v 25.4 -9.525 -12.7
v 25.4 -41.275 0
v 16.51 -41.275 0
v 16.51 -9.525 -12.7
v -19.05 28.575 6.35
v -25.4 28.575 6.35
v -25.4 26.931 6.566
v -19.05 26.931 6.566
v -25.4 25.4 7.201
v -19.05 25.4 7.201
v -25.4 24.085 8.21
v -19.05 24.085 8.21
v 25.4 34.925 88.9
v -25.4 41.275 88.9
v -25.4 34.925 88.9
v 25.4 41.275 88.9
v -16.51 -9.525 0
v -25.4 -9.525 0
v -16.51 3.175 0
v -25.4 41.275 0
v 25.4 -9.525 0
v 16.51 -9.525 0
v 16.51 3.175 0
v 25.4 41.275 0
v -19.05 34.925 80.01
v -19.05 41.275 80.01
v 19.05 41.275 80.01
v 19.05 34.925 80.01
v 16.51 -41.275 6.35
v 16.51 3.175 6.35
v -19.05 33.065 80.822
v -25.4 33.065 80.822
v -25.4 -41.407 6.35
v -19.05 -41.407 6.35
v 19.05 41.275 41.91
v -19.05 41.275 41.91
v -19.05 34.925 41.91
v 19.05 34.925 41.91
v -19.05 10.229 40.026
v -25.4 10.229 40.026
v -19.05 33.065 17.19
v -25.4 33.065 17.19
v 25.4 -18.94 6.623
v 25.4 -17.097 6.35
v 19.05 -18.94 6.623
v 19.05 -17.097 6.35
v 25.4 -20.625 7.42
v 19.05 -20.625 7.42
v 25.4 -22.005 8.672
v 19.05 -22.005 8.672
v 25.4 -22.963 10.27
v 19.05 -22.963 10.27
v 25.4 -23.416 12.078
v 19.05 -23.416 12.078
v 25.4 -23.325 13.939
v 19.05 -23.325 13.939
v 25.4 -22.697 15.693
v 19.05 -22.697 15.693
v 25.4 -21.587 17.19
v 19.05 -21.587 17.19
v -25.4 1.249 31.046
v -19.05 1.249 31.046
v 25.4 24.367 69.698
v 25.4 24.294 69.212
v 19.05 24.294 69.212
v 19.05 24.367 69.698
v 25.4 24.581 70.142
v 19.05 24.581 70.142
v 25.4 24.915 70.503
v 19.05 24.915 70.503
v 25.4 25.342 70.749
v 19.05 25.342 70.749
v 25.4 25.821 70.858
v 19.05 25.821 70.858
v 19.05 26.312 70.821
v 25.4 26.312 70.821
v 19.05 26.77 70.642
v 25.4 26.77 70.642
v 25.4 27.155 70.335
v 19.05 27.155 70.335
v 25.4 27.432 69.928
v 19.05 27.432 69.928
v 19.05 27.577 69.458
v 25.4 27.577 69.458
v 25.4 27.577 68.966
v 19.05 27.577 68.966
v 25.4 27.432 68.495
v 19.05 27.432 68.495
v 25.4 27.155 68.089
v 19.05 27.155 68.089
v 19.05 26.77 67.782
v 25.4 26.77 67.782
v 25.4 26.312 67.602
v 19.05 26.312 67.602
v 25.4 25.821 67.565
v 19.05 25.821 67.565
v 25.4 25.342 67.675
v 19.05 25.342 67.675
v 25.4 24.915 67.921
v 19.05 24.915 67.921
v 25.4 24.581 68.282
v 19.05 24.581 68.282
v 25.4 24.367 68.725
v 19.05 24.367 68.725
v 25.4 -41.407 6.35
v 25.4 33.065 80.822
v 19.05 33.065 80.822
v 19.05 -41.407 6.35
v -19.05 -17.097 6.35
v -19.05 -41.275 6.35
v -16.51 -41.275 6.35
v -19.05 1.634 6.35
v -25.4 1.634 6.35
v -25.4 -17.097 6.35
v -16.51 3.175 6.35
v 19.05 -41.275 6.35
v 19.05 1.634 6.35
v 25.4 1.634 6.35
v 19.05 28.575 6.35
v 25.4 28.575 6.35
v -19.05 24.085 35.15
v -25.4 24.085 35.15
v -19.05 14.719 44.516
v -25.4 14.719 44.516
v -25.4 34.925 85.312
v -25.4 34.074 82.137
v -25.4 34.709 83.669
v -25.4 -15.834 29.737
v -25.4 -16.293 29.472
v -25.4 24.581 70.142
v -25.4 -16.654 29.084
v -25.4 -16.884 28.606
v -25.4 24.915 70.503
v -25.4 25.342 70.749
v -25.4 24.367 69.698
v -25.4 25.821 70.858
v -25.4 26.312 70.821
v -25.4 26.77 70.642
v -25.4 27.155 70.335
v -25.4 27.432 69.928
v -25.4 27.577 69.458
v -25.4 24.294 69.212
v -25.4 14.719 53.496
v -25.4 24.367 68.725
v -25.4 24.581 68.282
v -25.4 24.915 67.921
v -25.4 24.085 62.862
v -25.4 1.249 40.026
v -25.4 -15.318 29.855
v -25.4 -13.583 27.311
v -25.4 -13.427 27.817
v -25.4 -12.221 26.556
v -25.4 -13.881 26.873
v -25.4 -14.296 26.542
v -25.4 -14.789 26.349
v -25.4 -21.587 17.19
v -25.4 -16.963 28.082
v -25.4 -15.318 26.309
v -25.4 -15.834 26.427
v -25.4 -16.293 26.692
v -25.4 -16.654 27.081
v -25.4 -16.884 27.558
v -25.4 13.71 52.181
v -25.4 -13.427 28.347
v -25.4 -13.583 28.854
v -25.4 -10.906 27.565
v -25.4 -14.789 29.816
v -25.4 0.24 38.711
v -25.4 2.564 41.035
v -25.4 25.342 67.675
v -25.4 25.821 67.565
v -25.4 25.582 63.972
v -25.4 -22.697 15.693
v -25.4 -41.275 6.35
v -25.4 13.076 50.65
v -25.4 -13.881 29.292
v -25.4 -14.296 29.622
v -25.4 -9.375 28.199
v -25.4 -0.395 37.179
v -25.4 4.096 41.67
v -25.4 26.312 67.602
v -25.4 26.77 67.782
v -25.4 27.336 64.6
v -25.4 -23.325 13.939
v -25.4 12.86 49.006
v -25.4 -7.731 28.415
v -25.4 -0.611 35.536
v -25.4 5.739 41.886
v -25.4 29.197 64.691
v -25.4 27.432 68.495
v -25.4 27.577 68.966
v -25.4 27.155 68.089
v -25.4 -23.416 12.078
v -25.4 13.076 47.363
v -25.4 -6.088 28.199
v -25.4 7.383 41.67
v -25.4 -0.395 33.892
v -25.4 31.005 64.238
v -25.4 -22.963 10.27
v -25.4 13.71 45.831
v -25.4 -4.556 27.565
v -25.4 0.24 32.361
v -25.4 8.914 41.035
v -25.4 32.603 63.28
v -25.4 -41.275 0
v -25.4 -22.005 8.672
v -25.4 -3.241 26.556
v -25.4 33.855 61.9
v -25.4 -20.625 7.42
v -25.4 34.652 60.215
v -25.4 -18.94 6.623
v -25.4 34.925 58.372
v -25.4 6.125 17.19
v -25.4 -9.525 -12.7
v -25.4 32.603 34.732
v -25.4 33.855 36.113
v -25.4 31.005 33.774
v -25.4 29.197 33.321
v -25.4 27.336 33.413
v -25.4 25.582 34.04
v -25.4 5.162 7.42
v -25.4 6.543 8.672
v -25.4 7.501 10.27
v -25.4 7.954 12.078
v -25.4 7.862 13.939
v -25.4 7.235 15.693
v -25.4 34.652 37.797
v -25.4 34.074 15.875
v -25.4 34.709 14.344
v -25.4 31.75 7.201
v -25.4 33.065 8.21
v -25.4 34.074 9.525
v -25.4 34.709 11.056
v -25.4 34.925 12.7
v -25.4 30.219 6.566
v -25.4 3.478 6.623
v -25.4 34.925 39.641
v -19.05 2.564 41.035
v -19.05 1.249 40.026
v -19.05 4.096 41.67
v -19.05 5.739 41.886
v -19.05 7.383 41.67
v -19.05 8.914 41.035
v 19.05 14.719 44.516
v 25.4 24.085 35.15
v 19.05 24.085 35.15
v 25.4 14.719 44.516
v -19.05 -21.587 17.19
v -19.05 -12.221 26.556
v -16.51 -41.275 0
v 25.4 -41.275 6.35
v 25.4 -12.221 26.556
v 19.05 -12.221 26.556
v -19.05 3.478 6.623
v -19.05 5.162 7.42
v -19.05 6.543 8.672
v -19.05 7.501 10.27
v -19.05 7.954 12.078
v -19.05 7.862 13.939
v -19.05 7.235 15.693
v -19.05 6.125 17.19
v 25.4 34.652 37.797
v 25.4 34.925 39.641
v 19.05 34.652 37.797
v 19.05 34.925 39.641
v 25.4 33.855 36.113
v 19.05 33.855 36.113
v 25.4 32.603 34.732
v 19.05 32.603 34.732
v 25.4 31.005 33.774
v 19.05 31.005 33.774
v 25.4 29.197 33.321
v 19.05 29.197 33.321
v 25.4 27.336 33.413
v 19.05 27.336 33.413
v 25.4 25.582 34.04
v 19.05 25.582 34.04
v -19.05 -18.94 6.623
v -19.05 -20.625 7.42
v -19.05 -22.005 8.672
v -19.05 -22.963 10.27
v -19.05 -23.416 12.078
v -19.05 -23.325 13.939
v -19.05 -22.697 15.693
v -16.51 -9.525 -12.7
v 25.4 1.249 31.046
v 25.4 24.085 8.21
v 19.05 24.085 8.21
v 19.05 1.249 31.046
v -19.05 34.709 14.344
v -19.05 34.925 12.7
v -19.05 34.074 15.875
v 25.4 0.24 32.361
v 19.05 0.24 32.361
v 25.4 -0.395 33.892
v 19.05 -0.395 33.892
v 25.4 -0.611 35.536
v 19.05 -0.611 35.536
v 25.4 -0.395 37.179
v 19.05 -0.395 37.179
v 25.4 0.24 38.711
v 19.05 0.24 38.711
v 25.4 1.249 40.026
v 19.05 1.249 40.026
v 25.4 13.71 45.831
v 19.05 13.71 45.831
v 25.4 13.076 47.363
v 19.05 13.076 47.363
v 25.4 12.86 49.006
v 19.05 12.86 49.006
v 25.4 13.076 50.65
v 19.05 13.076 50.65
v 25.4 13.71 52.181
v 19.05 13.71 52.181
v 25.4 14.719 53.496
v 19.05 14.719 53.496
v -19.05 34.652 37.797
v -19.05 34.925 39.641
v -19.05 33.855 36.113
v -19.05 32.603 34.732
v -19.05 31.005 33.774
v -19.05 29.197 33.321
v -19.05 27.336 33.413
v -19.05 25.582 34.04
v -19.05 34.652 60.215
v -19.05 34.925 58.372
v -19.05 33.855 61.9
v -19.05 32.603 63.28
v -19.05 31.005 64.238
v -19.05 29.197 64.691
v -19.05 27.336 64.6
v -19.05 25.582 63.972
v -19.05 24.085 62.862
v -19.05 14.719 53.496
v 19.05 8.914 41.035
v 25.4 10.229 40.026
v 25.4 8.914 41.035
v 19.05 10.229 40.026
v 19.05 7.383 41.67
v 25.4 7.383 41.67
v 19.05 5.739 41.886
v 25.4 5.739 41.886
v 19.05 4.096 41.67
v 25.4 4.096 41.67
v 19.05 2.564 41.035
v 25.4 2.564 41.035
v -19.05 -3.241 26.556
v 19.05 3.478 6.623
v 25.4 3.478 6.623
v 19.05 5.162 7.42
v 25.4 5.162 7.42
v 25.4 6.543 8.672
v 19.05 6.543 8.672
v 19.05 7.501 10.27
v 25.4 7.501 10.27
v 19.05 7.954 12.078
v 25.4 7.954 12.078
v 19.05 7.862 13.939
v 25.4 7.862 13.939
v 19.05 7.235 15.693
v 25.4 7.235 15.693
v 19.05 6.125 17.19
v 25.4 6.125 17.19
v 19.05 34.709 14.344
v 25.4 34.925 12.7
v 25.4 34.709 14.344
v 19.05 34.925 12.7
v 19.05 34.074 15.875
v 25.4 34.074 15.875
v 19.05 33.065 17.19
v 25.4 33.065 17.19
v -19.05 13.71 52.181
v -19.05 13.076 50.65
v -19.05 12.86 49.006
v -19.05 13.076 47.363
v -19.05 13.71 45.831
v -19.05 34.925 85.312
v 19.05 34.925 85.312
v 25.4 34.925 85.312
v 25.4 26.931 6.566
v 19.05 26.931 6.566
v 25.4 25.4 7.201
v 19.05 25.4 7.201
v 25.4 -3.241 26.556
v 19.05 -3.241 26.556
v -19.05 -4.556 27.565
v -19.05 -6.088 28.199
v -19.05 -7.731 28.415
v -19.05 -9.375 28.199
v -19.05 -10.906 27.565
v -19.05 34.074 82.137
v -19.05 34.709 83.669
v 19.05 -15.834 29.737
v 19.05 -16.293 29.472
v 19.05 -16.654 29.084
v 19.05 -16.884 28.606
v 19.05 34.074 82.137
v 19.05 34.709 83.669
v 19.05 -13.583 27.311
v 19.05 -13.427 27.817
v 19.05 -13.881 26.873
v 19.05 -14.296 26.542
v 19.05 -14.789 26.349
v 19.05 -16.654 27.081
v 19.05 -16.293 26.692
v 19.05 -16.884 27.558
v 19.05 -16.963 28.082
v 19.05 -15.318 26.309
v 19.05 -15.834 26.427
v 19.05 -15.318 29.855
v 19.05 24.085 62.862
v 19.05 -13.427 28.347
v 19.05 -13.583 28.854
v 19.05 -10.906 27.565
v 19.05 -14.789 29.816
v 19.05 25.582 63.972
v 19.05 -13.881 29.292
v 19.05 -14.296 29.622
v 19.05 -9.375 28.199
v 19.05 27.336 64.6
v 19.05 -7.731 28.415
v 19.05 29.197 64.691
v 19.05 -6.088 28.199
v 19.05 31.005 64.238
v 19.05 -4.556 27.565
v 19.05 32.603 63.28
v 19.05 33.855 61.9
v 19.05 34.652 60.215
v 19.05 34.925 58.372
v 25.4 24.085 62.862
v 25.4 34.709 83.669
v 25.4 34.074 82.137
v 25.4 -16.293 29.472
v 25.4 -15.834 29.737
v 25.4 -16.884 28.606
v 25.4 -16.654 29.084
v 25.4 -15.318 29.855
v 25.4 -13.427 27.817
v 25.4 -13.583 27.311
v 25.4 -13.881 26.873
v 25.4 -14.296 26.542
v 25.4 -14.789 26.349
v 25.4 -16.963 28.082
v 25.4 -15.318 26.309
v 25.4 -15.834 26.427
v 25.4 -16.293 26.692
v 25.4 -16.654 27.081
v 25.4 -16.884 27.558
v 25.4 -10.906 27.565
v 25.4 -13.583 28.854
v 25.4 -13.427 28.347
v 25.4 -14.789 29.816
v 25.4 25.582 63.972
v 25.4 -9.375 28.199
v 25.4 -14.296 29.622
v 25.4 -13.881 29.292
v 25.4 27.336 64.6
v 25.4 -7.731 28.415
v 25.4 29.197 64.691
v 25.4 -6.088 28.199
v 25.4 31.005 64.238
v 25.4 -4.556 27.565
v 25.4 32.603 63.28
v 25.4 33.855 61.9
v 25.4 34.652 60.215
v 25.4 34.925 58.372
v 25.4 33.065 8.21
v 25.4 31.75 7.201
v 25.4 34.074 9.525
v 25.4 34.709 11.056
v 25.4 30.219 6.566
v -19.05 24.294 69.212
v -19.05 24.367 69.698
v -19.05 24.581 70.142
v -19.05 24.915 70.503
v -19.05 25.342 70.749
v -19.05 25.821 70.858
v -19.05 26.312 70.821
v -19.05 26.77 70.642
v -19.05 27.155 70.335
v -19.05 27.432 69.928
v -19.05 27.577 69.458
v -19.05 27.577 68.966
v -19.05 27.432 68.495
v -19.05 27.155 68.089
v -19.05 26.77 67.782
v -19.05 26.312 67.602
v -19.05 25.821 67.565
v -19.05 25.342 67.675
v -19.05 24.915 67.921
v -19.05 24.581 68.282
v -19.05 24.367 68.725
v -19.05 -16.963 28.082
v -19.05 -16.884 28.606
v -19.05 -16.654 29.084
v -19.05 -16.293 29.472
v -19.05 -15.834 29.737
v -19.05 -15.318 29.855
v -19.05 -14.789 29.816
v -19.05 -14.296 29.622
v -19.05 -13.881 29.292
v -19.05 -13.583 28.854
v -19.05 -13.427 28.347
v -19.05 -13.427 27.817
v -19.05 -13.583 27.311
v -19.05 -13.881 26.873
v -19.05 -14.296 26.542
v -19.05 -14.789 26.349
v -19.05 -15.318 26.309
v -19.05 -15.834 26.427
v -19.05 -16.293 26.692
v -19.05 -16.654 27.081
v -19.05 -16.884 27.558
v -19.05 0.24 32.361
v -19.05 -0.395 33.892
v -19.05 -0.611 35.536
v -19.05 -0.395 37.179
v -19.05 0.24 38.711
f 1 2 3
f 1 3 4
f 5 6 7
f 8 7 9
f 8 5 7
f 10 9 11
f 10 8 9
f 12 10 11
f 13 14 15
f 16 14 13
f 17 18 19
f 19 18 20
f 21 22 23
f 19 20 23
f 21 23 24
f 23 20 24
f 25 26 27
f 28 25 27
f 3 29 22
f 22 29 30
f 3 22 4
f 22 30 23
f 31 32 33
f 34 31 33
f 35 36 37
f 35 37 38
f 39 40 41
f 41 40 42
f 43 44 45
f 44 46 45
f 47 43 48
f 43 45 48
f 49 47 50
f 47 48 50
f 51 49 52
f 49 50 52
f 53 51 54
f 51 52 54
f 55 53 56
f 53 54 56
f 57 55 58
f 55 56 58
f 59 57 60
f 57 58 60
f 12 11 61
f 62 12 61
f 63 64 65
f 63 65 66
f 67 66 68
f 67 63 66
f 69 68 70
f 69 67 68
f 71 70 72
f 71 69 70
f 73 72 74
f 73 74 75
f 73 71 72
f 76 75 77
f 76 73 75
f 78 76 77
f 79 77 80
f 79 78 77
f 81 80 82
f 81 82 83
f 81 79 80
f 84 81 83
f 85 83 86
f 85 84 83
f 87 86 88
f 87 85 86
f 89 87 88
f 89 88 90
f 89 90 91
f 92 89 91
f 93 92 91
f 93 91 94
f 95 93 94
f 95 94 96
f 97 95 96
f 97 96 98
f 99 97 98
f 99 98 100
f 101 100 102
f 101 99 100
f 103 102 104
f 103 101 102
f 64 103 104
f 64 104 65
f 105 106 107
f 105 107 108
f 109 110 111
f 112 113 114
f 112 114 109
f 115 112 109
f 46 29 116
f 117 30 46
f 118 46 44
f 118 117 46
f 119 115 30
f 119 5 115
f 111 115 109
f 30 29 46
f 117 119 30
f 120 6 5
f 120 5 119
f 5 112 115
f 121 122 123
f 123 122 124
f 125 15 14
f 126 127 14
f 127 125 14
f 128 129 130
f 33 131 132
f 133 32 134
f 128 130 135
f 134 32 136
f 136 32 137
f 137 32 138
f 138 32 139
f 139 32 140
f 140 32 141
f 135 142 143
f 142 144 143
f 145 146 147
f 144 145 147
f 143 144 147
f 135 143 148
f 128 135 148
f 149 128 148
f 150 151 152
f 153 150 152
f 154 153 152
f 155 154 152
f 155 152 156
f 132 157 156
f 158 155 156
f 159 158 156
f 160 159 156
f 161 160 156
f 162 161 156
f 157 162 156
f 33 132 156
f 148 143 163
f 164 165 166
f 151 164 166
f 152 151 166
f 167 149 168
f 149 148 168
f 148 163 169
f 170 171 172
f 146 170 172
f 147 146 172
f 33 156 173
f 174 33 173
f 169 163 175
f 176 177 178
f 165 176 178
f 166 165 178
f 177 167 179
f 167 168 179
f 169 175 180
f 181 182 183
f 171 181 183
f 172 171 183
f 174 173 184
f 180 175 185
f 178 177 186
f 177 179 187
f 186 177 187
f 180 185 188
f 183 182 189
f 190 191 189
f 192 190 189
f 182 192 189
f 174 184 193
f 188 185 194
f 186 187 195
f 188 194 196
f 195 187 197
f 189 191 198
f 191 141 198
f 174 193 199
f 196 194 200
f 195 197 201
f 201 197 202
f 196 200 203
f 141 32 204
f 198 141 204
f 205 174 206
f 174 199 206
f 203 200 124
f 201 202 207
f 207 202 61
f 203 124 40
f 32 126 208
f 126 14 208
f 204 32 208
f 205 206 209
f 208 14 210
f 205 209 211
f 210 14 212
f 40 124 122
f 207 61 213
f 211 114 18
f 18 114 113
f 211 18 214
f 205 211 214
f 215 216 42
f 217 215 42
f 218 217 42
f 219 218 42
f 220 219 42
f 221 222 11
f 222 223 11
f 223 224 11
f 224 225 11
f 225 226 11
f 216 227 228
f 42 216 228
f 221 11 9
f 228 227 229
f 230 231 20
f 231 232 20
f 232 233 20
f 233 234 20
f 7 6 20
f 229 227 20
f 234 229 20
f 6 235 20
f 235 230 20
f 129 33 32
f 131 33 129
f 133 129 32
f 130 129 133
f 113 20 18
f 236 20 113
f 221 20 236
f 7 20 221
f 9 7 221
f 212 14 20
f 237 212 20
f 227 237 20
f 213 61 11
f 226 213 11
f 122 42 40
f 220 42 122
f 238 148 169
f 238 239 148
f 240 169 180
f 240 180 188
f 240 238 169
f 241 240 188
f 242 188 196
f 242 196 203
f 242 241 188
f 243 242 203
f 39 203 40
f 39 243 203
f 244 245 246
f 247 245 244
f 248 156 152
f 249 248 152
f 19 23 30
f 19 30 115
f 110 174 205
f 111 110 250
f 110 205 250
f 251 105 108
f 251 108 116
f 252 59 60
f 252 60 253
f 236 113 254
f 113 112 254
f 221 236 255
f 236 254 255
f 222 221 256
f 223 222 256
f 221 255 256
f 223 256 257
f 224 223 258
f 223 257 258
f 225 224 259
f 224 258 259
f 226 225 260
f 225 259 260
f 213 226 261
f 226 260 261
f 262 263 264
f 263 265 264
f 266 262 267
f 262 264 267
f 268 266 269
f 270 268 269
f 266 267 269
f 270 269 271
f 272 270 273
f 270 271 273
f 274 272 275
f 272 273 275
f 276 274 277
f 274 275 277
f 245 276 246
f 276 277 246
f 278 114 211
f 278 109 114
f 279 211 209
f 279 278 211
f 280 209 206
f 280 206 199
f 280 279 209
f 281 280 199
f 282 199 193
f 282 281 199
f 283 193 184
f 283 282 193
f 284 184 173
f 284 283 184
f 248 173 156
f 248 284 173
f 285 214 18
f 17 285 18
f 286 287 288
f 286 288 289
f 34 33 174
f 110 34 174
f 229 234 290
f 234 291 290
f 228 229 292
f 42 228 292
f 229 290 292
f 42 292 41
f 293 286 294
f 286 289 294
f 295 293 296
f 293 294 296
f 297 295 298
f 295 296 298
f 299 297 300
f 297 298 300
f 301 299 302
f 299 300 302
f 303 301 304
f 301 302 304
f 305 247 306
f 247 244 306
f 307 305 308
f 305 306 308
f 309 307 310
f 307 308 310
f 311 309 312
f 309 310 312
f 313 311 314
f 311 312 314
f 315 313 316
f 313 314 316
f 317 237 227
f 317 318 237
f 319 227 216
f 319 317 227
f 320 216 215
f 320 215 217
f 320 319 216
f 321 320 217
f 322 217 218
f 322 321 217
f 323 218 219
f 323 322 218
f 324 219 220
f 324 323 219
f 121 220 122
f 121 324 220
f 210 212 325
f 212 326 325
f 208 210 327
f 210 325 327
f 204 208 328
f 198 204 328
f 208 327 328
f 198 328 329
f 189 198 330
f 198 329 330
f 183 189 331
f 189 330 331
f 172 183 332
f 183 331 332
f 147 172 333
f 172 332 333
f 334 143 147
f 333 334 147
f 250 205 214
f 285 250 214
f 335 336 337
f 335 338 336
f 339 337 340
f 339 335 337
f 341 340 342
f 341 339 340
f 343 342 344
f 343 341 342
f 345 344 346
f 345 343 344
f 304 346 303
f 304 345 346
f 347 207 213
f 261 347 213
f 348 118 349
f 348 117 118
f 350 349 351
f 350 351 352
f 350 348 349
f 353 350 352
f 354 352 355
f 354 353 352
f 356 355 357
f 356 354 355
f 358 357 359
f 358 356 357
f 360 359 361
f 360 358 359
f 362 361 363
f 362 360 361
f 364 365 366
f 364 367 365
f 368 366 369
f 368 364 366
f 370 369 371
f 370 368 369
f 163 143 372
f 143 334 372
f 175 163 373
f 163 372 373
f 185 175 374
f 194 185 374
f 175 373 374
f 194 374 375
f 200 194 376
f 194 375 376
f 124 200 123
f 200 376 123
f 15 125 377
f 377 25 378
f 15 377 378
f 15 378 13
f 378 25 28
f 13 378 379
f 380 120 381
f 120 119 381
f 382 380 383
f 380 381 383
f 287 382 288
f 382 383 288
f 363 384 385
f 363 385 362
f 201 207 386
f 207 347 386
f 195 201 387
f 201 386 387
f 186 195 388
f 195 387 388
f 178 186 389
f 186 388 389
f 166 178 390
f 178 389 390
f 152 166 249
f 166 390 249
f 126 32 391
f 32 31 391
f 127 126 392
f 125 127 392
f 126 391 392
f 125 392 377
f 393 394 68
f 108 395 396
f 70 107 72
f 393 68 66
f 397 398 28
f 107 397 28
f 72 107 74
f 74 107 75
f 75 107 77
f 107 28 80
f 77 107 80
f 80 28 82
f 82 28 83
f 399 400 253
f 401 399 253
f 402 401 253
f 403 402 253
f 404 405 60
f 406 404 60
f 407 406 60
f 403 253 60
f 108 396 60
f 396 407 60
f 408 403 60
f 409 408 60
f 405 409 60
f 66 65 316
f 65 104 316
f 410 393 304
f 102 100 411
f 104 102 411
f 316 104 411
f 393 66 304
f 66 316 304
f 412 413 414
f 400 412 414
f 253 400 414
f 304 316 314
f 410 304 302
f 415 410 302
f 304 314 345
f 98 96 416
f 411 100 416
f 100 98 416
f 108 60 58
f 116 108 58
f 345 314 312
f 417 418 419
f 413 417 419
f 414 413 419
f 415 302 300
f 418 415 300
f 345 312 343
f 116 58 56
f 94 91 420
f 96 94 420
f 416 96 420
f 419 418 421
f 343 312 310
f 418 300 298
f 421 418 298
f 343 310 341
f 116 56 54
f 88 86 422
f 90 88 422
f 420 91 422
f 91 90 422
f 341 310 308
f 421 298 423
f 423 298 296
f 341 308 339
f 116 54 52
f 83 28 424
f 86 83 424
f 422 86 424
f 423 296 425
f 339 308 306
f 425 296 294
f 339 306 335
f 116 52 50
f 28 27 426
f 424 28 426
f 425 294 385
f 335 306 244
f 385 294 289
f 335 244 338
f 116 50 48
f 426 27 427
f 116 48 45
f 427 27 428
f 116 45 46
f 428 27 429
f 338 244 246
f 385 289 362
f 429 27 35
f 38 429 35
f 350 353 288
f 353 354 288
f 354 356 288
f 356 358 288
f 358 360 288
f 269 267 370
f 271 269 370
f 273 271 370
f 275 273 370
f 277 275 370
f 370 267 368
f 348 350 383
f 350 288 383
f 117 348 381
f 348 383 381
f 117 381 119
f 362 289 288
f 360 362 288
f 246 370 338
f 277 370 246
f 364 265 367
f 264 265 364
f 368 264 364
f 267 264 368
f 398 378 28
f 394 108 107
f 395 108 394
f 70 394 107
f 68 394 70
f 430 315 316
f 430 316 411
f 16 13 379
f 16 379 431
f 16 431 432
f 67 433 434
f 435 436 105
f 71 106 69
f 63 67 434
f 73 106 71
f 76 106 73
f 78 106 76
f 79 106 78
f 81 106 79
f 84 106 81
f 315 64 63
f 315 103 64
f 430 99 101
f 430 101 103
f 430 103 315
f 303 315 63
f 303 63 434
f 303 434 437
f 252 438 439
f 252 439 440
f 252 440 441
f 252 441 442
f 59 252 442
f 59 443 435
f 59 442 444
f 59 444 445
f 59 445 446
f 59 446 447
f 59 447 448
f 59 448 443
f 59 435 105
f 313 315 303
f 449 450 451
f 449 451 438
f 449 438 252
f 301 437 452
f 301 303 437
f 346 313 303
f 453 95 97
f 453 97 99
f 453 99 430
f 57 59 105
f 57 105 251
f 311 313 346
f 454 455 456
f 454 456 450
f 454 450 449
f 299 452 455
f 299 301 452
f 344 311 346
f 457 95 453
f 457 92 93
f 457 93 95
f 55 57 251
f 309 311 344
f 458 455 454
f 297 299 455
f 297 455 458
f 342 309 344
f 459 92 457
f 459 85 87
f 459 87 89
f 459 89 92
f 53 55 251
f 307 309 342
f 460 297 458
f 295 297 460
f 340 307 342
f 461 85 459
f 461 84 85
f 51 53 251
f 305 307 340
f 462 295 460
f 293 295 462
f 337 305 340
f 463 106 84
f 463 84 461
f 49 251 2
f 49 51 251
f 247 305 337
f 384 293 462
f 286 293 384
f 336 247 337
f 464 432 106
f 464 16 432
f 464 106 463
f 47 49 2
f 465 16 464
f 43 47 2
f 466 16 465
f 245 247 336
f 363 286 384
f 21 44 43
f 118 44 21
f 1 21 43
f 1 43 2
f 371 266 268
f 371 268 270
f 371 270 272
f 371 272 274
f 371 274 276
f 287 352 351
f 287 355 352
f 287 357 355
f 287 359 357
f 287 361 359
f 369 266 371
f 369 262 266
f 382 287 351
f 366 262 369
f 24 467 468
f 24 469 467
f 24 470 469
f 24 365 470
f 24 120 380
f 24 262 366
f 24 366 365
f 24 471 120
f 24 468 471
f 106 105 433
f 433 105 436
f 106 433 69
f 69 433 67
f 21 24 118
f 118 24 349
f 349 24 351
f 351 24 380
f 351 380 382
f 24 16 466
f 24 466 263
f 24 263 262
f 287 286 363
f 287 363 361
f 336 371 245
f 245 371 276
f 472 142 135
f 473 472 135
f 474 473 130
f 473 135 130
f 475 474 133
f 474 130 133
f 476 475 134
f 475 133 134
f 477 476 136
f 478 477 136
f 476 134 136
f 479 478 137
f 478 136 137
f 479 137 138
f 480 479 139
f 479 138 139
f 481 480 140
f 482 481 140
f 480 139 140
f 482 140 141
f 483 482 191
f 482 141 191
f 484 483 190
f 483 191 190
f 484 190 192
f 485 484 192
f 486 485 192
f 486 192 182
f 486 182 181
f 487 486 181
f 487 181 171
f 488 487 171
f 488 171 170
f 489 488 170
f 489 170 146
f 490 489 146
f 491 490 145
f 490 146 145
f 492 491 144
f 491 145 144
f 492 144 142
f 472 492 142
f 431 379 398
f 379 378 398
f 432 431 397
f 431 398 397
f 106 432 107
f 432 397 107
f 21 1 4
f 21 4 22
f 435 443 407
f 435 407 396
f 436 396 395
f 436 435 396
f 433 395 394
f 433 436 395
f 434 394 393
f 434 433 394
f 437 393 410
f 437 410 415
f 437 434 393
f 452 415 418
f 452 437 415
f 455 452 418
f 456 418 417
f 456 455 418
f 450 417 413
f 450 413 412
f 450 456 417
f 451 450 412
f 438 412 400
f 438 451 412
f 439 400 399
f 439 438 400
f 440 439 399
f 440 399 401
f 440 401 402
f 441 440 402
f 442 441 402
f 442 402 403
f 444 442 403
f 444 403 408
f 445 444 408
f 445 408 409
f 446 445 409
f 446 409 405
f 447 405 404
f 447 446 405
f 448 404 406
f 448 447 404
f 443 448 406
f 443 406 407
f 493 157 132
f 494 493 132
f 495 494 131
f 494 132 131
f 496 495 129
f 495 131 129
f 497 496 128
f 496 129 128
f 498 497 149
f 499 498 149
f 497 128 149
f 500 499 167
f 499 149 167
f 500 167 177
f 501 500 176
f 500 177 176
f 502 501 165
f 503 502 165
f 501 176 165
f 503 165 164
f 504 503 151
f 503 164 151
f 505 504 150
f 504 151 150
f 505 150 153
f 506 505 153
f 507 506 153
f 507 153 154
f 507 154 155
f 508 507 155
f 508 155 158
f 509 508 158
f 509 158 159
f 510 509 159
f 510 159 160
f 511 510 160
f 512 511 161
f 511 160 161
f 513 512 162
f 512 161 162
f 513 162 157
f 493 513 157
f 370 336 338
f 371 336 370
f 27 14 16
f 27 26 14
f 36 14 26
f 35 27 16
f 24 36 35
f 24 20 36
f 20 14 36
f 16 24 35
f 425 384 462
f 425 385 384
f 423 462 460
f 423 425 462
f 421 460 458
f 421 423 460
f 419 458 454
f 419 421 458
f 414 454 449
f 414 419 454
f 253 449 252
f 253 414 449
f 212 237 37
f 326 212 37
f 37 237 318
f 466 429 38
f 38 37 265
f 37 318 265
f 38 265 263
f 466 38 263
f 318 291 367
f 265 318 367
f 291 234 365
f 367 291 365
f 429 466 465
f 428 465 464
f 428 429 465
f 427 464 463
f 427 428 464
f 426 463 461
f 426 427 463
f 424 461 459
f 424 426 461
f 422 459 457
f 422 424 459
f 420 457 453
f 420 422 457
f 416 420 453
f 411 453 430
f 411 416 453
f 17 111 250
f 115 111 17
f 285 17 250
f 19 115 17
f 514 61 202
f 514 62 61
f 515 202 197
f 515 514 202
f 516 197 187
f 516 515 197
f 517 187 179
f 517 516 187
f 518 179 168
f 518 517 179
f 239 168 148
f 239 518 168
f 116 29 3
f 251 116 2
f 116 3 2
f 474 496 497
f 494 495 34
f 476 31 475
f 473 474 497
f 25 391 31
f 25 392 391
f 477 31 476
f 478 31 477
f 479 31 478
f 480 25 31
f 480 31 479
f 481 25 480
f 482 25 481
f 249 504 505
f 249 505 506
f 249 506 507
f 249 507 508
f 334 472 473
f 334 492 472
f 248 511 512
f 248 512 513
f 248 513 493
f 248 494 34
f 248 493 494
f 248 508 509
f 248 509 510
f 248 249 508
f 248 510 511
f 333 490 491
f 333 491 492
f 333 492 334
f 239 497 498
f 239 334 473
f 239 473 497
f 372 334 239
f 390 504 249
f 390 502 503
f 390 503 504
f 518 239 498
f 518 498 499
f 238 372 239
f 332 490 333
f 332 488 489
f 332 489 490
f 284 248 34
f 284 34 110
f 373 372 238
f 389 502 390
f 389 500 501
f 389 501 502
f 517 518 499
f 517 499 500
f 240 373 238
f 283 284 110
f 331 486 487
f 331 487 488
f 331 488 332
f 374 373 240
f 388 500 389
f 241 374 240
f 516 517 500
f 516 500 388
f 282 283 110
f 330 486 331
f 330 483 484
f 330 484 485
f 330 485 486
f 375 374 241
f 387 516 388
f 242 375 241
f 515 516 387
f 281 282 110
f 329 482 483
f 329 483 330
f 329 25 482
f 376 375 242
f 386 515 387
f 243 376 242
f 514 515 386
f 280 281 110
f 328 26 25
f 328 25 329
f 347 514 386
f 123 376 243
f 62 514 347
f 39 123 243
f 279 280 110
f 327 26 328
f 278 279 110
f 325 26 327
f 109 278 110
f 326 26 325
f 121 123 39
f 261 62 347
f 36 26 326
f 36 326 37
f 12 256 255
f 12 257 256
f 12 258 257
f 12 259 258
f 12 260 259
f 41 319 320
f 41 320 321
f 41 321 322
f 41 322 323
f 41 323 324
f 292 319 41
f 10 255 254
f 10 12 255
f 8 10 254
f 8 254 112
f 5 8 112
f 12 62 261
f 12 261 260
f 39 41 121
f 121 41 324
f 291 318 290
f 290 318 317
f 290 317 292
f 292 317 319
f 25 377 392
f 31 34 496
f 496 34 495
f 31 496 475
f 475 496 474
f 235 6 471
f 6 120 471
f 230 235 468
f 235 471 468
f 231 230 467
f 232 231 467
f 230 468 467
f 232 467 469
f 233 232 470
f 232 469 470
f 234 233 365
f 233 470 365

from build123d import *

# Parameters (mm, degrees)
ESQUISSE1_W             = 50.8
ESQUISSE1_H             = 82.55
BOSS_EXTRU_1_DEPTH      = 6.35
ESQUISSE2_W             = 50.8
ESQUISSE2_H             = 82.55
BOSS_EXTRU_2_DEPTH      = 6.35
ESQUISSE4_R             = 1.778
ESQUISSE4_R_2           = 1.651
BOSS_EXTRU_3_DEPTH      = 6.35
ESQUISSE5_W             = 38.1
ESQUISSE5_H             = 38.1
ENL_V_MAT_EXTRU_1_DEPTH = 6.35
ESQUISSE7_W             = 33.02
ESQUISSE7_H             = 44.45
ENL_V_MAT_EXTRU_2_DEPTH = 6.35
BOSS_EXTRU_4_DEPTH      = 8.89
CONG_1_R                = 6.35


with BuildPart() as part:
    # Esquisse1 → Boss.-Extru.1 (new body)
    with BuildSketch(Plane.XY):
        Rectangle(ESQUISSE1_W, ESQUISSE1_H)
    extrude(amount=BOSS_EXTRU_1_DEPTH)

    # Esquisse2 → Boss.-Extru.2 (add)
    with BuildSketch(Plane(origin=(0, 41.275, 0), x_dir=(1, 0, 0), z_dir=(0, 1, 0))):
        with Locations((0, -47.625)):
            Rectangle(ESQUISSE2_W, ESQUISSE2_H)
    extrude(amount=-BOSS_EXTRU_2_DEPTH)

    # Esquisse4 → Boss.-Extru.3 (add)
    with BuildSketch(Plane.ZY.offset(25.4)):
        Polygon((6.35, -32.426920908), (31.045704333, -7.731216575), (6.35, 16.964487758), (6.35, 25.944743879), (35.535832393, -3.241088515), (44.516088515, 5.739167607), (15.330256121, 34.925), (24.310512242, 34.925), (49.006216575, 10.229295667), (73.701920908, 34.925), (82.682177029, 34.925), (6.35, -41.407177029), align=None)
        with Locations(Location((28.082219813, -15.184829156, 0), (0, 0, 270))):
            Circle(ESQUISSE4_R, mode=Mode.SUBTRACT)
        with Locations(Location((69.211792847, 25.944743879, 0), (0, 0, 270))):
            Circle(ESQUISSE4_R_2, mode=Mode.SUBTRACT)
    boss_extru_3 = extrude(amount=-BOSS_EXTRU_3_DEPTH)

    # Symétrie1: Boss.-Extru.3 across plane
    add(boss_extru_3.mirror(Plane(origin=(0, 0, 0), x_dir=(0, 0, 1), z_dir=(1, 0, 0))))

    # Esquisse5 → Enlèv. mat.-Extru.1 (cut)
    with BuildSketch(Plane(origin=(0, 41.275, 0), x_dir=(1, 0, 0), z_dir=(0, 1, 0))):
        with Locations((0, -60.96)):
            Rectangle(ESQUISSE5_W, ESQUISSE5_H)
    extrude(amount=-ENL_V_MAT_EXTRU_1_DEPTH, mode=Mode.SUBTRACT)

    # Esquisse7 → Enlèv. mat.-Extru.2 (cut)
    with BuildSketch(Plane(origin=(0, 0, 0), x_dir=(-1, 0, 0), z_dir=(0, 0, -1))):
        with Locations((0, -19.05)):
            Rectangle(ESQUISSE7_W, ESQUISSE7_H)
    extrude(amount=-ENL_V_MAT_EXTRU_2_DEPTH, mode=Mode.SUBTRACT)

    # Esquisse8 → Boss.-Extru.4 (add)
    with BuildSketch(Plane(origin=(25.4, 0, 0), x_dir=(0, 0, -1), z_dir=(1, 0, 0))):
        Polygon((0, -41.275), (12.7, -9.525), (0, -9.525), align=None)
    boss_extru_4 = extrude(amount=-BOSS_EXTRU_4_DEPTH)

    # Symétrie2: Boss.-Extru.4 across plane
    add(boss_extru_4.mirror(Plane(origin=(0, 0, 0), x_dir=(0, 0, 1), z_dir=(1, 0, 0))))

    # Congé1
    cong_1_edges = [part.edges().sort_by_distance(p)[0] for p in [
        (0, 34.925, 6.35),
        (-22.225, -32.426920908, 6.35),
        (-22.225, -7.731216575, 31.045704333),
        (-22.225, 16.964487758, 6.35),
        (-22.225, 25.944743879, 6.35),
        (-22.225, -3.241088515, 35.535832393),
        (-22.225, 5.739167607, 44.516088515),
        (-22.225, 34.925, 15.330256121),
        (-22.225, 34.925, 24.310512242),
        (-22.225, 10.229295667, 49.006216575),
        (-22.225, 34.925, 73.701920908),
        (-22.225, 34.925, 82.682177029),
        (22.225, -32.426920908, 6.35),
        (22.225, 34.925, 82.682177029),
        (22.225, 34.925, 73.701920908),
        (22.225, 10.229295667, 49.006216575),
        (22.225, 34.925, 24.310512242),
        (22.225, 34.925, 15.330256121),
        (22.225, 5.739167607, 44.516088515),
        (22.225, -3.241088515, 35.535832393),
        (22.225, 25.944743879, 6.35),
        (22.225, 16.964487758, 6.35),
        (22.225, -7.731216575, 31.045704333),
    ]]
    fillet(cong_1_edges, radius=CONG_1_R - 0.0001)  # a hair under: the kernel refuses the full size


solid = part.part
